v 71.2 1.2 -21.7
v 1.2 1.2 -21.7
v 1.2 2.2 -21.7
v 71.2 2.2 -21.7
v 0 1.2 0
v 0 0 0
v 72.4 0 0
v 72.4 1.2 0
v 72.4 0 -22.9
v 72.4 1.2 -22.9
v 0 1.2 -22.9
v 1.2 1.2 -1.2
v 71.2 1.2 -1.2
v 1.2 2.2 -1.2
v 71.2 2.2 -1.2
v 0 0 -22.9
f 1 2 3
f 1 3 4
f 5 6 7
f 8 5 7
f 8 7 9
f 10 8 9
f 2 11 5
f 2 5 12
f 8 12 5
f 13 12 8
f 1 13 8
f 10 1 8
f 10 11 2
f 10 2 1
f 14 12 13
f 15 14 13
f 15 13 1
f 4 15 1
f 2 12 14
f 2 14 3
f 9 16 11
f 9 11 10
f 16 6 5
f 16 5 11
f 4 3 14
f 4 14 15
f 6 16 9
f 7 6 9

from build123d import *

# Parameters (mm, degrees)
SKICA1_W                = 72.4
SKICA1_H                = 22.9
P_IDAT_VYSUNUT_M2_DEPTH = 1.2
SKICA2_W                = 70
SKICA2_H                = 20.5
P_IDAT_VYSUNUT_M3_DEPTH = 1


with BuildPart() as part:
    # Skica1 → Přidat vysunutím2 (new body)
    with BuildSketch(Plane(origin=(0, 0, 0), x_dir=(1, 0, 0), z_dir=(0, 1, 0))):
        with Locations((36.2, 11.45)):
            Rectangle(SKICA1_W, SKICA1_H)
    extrude(amount=P_IDAT_VYSUNUT_M2_DEPTH)

    # Skica2 → Přidat vysunutím3 (add)
    with BuildSketch(Plane(origin=(0, 1.2, 0), x_dir=(1, 0, 0), z_dir=(0, 1, 0))):
        with Locations((36.2, 11.45)):
            Rectangle(SKICA2_W, SKICA2_H)
    extrude(amount=P_IDAT_VYSUNUT_M3_DEPTH)


solid = part.part
